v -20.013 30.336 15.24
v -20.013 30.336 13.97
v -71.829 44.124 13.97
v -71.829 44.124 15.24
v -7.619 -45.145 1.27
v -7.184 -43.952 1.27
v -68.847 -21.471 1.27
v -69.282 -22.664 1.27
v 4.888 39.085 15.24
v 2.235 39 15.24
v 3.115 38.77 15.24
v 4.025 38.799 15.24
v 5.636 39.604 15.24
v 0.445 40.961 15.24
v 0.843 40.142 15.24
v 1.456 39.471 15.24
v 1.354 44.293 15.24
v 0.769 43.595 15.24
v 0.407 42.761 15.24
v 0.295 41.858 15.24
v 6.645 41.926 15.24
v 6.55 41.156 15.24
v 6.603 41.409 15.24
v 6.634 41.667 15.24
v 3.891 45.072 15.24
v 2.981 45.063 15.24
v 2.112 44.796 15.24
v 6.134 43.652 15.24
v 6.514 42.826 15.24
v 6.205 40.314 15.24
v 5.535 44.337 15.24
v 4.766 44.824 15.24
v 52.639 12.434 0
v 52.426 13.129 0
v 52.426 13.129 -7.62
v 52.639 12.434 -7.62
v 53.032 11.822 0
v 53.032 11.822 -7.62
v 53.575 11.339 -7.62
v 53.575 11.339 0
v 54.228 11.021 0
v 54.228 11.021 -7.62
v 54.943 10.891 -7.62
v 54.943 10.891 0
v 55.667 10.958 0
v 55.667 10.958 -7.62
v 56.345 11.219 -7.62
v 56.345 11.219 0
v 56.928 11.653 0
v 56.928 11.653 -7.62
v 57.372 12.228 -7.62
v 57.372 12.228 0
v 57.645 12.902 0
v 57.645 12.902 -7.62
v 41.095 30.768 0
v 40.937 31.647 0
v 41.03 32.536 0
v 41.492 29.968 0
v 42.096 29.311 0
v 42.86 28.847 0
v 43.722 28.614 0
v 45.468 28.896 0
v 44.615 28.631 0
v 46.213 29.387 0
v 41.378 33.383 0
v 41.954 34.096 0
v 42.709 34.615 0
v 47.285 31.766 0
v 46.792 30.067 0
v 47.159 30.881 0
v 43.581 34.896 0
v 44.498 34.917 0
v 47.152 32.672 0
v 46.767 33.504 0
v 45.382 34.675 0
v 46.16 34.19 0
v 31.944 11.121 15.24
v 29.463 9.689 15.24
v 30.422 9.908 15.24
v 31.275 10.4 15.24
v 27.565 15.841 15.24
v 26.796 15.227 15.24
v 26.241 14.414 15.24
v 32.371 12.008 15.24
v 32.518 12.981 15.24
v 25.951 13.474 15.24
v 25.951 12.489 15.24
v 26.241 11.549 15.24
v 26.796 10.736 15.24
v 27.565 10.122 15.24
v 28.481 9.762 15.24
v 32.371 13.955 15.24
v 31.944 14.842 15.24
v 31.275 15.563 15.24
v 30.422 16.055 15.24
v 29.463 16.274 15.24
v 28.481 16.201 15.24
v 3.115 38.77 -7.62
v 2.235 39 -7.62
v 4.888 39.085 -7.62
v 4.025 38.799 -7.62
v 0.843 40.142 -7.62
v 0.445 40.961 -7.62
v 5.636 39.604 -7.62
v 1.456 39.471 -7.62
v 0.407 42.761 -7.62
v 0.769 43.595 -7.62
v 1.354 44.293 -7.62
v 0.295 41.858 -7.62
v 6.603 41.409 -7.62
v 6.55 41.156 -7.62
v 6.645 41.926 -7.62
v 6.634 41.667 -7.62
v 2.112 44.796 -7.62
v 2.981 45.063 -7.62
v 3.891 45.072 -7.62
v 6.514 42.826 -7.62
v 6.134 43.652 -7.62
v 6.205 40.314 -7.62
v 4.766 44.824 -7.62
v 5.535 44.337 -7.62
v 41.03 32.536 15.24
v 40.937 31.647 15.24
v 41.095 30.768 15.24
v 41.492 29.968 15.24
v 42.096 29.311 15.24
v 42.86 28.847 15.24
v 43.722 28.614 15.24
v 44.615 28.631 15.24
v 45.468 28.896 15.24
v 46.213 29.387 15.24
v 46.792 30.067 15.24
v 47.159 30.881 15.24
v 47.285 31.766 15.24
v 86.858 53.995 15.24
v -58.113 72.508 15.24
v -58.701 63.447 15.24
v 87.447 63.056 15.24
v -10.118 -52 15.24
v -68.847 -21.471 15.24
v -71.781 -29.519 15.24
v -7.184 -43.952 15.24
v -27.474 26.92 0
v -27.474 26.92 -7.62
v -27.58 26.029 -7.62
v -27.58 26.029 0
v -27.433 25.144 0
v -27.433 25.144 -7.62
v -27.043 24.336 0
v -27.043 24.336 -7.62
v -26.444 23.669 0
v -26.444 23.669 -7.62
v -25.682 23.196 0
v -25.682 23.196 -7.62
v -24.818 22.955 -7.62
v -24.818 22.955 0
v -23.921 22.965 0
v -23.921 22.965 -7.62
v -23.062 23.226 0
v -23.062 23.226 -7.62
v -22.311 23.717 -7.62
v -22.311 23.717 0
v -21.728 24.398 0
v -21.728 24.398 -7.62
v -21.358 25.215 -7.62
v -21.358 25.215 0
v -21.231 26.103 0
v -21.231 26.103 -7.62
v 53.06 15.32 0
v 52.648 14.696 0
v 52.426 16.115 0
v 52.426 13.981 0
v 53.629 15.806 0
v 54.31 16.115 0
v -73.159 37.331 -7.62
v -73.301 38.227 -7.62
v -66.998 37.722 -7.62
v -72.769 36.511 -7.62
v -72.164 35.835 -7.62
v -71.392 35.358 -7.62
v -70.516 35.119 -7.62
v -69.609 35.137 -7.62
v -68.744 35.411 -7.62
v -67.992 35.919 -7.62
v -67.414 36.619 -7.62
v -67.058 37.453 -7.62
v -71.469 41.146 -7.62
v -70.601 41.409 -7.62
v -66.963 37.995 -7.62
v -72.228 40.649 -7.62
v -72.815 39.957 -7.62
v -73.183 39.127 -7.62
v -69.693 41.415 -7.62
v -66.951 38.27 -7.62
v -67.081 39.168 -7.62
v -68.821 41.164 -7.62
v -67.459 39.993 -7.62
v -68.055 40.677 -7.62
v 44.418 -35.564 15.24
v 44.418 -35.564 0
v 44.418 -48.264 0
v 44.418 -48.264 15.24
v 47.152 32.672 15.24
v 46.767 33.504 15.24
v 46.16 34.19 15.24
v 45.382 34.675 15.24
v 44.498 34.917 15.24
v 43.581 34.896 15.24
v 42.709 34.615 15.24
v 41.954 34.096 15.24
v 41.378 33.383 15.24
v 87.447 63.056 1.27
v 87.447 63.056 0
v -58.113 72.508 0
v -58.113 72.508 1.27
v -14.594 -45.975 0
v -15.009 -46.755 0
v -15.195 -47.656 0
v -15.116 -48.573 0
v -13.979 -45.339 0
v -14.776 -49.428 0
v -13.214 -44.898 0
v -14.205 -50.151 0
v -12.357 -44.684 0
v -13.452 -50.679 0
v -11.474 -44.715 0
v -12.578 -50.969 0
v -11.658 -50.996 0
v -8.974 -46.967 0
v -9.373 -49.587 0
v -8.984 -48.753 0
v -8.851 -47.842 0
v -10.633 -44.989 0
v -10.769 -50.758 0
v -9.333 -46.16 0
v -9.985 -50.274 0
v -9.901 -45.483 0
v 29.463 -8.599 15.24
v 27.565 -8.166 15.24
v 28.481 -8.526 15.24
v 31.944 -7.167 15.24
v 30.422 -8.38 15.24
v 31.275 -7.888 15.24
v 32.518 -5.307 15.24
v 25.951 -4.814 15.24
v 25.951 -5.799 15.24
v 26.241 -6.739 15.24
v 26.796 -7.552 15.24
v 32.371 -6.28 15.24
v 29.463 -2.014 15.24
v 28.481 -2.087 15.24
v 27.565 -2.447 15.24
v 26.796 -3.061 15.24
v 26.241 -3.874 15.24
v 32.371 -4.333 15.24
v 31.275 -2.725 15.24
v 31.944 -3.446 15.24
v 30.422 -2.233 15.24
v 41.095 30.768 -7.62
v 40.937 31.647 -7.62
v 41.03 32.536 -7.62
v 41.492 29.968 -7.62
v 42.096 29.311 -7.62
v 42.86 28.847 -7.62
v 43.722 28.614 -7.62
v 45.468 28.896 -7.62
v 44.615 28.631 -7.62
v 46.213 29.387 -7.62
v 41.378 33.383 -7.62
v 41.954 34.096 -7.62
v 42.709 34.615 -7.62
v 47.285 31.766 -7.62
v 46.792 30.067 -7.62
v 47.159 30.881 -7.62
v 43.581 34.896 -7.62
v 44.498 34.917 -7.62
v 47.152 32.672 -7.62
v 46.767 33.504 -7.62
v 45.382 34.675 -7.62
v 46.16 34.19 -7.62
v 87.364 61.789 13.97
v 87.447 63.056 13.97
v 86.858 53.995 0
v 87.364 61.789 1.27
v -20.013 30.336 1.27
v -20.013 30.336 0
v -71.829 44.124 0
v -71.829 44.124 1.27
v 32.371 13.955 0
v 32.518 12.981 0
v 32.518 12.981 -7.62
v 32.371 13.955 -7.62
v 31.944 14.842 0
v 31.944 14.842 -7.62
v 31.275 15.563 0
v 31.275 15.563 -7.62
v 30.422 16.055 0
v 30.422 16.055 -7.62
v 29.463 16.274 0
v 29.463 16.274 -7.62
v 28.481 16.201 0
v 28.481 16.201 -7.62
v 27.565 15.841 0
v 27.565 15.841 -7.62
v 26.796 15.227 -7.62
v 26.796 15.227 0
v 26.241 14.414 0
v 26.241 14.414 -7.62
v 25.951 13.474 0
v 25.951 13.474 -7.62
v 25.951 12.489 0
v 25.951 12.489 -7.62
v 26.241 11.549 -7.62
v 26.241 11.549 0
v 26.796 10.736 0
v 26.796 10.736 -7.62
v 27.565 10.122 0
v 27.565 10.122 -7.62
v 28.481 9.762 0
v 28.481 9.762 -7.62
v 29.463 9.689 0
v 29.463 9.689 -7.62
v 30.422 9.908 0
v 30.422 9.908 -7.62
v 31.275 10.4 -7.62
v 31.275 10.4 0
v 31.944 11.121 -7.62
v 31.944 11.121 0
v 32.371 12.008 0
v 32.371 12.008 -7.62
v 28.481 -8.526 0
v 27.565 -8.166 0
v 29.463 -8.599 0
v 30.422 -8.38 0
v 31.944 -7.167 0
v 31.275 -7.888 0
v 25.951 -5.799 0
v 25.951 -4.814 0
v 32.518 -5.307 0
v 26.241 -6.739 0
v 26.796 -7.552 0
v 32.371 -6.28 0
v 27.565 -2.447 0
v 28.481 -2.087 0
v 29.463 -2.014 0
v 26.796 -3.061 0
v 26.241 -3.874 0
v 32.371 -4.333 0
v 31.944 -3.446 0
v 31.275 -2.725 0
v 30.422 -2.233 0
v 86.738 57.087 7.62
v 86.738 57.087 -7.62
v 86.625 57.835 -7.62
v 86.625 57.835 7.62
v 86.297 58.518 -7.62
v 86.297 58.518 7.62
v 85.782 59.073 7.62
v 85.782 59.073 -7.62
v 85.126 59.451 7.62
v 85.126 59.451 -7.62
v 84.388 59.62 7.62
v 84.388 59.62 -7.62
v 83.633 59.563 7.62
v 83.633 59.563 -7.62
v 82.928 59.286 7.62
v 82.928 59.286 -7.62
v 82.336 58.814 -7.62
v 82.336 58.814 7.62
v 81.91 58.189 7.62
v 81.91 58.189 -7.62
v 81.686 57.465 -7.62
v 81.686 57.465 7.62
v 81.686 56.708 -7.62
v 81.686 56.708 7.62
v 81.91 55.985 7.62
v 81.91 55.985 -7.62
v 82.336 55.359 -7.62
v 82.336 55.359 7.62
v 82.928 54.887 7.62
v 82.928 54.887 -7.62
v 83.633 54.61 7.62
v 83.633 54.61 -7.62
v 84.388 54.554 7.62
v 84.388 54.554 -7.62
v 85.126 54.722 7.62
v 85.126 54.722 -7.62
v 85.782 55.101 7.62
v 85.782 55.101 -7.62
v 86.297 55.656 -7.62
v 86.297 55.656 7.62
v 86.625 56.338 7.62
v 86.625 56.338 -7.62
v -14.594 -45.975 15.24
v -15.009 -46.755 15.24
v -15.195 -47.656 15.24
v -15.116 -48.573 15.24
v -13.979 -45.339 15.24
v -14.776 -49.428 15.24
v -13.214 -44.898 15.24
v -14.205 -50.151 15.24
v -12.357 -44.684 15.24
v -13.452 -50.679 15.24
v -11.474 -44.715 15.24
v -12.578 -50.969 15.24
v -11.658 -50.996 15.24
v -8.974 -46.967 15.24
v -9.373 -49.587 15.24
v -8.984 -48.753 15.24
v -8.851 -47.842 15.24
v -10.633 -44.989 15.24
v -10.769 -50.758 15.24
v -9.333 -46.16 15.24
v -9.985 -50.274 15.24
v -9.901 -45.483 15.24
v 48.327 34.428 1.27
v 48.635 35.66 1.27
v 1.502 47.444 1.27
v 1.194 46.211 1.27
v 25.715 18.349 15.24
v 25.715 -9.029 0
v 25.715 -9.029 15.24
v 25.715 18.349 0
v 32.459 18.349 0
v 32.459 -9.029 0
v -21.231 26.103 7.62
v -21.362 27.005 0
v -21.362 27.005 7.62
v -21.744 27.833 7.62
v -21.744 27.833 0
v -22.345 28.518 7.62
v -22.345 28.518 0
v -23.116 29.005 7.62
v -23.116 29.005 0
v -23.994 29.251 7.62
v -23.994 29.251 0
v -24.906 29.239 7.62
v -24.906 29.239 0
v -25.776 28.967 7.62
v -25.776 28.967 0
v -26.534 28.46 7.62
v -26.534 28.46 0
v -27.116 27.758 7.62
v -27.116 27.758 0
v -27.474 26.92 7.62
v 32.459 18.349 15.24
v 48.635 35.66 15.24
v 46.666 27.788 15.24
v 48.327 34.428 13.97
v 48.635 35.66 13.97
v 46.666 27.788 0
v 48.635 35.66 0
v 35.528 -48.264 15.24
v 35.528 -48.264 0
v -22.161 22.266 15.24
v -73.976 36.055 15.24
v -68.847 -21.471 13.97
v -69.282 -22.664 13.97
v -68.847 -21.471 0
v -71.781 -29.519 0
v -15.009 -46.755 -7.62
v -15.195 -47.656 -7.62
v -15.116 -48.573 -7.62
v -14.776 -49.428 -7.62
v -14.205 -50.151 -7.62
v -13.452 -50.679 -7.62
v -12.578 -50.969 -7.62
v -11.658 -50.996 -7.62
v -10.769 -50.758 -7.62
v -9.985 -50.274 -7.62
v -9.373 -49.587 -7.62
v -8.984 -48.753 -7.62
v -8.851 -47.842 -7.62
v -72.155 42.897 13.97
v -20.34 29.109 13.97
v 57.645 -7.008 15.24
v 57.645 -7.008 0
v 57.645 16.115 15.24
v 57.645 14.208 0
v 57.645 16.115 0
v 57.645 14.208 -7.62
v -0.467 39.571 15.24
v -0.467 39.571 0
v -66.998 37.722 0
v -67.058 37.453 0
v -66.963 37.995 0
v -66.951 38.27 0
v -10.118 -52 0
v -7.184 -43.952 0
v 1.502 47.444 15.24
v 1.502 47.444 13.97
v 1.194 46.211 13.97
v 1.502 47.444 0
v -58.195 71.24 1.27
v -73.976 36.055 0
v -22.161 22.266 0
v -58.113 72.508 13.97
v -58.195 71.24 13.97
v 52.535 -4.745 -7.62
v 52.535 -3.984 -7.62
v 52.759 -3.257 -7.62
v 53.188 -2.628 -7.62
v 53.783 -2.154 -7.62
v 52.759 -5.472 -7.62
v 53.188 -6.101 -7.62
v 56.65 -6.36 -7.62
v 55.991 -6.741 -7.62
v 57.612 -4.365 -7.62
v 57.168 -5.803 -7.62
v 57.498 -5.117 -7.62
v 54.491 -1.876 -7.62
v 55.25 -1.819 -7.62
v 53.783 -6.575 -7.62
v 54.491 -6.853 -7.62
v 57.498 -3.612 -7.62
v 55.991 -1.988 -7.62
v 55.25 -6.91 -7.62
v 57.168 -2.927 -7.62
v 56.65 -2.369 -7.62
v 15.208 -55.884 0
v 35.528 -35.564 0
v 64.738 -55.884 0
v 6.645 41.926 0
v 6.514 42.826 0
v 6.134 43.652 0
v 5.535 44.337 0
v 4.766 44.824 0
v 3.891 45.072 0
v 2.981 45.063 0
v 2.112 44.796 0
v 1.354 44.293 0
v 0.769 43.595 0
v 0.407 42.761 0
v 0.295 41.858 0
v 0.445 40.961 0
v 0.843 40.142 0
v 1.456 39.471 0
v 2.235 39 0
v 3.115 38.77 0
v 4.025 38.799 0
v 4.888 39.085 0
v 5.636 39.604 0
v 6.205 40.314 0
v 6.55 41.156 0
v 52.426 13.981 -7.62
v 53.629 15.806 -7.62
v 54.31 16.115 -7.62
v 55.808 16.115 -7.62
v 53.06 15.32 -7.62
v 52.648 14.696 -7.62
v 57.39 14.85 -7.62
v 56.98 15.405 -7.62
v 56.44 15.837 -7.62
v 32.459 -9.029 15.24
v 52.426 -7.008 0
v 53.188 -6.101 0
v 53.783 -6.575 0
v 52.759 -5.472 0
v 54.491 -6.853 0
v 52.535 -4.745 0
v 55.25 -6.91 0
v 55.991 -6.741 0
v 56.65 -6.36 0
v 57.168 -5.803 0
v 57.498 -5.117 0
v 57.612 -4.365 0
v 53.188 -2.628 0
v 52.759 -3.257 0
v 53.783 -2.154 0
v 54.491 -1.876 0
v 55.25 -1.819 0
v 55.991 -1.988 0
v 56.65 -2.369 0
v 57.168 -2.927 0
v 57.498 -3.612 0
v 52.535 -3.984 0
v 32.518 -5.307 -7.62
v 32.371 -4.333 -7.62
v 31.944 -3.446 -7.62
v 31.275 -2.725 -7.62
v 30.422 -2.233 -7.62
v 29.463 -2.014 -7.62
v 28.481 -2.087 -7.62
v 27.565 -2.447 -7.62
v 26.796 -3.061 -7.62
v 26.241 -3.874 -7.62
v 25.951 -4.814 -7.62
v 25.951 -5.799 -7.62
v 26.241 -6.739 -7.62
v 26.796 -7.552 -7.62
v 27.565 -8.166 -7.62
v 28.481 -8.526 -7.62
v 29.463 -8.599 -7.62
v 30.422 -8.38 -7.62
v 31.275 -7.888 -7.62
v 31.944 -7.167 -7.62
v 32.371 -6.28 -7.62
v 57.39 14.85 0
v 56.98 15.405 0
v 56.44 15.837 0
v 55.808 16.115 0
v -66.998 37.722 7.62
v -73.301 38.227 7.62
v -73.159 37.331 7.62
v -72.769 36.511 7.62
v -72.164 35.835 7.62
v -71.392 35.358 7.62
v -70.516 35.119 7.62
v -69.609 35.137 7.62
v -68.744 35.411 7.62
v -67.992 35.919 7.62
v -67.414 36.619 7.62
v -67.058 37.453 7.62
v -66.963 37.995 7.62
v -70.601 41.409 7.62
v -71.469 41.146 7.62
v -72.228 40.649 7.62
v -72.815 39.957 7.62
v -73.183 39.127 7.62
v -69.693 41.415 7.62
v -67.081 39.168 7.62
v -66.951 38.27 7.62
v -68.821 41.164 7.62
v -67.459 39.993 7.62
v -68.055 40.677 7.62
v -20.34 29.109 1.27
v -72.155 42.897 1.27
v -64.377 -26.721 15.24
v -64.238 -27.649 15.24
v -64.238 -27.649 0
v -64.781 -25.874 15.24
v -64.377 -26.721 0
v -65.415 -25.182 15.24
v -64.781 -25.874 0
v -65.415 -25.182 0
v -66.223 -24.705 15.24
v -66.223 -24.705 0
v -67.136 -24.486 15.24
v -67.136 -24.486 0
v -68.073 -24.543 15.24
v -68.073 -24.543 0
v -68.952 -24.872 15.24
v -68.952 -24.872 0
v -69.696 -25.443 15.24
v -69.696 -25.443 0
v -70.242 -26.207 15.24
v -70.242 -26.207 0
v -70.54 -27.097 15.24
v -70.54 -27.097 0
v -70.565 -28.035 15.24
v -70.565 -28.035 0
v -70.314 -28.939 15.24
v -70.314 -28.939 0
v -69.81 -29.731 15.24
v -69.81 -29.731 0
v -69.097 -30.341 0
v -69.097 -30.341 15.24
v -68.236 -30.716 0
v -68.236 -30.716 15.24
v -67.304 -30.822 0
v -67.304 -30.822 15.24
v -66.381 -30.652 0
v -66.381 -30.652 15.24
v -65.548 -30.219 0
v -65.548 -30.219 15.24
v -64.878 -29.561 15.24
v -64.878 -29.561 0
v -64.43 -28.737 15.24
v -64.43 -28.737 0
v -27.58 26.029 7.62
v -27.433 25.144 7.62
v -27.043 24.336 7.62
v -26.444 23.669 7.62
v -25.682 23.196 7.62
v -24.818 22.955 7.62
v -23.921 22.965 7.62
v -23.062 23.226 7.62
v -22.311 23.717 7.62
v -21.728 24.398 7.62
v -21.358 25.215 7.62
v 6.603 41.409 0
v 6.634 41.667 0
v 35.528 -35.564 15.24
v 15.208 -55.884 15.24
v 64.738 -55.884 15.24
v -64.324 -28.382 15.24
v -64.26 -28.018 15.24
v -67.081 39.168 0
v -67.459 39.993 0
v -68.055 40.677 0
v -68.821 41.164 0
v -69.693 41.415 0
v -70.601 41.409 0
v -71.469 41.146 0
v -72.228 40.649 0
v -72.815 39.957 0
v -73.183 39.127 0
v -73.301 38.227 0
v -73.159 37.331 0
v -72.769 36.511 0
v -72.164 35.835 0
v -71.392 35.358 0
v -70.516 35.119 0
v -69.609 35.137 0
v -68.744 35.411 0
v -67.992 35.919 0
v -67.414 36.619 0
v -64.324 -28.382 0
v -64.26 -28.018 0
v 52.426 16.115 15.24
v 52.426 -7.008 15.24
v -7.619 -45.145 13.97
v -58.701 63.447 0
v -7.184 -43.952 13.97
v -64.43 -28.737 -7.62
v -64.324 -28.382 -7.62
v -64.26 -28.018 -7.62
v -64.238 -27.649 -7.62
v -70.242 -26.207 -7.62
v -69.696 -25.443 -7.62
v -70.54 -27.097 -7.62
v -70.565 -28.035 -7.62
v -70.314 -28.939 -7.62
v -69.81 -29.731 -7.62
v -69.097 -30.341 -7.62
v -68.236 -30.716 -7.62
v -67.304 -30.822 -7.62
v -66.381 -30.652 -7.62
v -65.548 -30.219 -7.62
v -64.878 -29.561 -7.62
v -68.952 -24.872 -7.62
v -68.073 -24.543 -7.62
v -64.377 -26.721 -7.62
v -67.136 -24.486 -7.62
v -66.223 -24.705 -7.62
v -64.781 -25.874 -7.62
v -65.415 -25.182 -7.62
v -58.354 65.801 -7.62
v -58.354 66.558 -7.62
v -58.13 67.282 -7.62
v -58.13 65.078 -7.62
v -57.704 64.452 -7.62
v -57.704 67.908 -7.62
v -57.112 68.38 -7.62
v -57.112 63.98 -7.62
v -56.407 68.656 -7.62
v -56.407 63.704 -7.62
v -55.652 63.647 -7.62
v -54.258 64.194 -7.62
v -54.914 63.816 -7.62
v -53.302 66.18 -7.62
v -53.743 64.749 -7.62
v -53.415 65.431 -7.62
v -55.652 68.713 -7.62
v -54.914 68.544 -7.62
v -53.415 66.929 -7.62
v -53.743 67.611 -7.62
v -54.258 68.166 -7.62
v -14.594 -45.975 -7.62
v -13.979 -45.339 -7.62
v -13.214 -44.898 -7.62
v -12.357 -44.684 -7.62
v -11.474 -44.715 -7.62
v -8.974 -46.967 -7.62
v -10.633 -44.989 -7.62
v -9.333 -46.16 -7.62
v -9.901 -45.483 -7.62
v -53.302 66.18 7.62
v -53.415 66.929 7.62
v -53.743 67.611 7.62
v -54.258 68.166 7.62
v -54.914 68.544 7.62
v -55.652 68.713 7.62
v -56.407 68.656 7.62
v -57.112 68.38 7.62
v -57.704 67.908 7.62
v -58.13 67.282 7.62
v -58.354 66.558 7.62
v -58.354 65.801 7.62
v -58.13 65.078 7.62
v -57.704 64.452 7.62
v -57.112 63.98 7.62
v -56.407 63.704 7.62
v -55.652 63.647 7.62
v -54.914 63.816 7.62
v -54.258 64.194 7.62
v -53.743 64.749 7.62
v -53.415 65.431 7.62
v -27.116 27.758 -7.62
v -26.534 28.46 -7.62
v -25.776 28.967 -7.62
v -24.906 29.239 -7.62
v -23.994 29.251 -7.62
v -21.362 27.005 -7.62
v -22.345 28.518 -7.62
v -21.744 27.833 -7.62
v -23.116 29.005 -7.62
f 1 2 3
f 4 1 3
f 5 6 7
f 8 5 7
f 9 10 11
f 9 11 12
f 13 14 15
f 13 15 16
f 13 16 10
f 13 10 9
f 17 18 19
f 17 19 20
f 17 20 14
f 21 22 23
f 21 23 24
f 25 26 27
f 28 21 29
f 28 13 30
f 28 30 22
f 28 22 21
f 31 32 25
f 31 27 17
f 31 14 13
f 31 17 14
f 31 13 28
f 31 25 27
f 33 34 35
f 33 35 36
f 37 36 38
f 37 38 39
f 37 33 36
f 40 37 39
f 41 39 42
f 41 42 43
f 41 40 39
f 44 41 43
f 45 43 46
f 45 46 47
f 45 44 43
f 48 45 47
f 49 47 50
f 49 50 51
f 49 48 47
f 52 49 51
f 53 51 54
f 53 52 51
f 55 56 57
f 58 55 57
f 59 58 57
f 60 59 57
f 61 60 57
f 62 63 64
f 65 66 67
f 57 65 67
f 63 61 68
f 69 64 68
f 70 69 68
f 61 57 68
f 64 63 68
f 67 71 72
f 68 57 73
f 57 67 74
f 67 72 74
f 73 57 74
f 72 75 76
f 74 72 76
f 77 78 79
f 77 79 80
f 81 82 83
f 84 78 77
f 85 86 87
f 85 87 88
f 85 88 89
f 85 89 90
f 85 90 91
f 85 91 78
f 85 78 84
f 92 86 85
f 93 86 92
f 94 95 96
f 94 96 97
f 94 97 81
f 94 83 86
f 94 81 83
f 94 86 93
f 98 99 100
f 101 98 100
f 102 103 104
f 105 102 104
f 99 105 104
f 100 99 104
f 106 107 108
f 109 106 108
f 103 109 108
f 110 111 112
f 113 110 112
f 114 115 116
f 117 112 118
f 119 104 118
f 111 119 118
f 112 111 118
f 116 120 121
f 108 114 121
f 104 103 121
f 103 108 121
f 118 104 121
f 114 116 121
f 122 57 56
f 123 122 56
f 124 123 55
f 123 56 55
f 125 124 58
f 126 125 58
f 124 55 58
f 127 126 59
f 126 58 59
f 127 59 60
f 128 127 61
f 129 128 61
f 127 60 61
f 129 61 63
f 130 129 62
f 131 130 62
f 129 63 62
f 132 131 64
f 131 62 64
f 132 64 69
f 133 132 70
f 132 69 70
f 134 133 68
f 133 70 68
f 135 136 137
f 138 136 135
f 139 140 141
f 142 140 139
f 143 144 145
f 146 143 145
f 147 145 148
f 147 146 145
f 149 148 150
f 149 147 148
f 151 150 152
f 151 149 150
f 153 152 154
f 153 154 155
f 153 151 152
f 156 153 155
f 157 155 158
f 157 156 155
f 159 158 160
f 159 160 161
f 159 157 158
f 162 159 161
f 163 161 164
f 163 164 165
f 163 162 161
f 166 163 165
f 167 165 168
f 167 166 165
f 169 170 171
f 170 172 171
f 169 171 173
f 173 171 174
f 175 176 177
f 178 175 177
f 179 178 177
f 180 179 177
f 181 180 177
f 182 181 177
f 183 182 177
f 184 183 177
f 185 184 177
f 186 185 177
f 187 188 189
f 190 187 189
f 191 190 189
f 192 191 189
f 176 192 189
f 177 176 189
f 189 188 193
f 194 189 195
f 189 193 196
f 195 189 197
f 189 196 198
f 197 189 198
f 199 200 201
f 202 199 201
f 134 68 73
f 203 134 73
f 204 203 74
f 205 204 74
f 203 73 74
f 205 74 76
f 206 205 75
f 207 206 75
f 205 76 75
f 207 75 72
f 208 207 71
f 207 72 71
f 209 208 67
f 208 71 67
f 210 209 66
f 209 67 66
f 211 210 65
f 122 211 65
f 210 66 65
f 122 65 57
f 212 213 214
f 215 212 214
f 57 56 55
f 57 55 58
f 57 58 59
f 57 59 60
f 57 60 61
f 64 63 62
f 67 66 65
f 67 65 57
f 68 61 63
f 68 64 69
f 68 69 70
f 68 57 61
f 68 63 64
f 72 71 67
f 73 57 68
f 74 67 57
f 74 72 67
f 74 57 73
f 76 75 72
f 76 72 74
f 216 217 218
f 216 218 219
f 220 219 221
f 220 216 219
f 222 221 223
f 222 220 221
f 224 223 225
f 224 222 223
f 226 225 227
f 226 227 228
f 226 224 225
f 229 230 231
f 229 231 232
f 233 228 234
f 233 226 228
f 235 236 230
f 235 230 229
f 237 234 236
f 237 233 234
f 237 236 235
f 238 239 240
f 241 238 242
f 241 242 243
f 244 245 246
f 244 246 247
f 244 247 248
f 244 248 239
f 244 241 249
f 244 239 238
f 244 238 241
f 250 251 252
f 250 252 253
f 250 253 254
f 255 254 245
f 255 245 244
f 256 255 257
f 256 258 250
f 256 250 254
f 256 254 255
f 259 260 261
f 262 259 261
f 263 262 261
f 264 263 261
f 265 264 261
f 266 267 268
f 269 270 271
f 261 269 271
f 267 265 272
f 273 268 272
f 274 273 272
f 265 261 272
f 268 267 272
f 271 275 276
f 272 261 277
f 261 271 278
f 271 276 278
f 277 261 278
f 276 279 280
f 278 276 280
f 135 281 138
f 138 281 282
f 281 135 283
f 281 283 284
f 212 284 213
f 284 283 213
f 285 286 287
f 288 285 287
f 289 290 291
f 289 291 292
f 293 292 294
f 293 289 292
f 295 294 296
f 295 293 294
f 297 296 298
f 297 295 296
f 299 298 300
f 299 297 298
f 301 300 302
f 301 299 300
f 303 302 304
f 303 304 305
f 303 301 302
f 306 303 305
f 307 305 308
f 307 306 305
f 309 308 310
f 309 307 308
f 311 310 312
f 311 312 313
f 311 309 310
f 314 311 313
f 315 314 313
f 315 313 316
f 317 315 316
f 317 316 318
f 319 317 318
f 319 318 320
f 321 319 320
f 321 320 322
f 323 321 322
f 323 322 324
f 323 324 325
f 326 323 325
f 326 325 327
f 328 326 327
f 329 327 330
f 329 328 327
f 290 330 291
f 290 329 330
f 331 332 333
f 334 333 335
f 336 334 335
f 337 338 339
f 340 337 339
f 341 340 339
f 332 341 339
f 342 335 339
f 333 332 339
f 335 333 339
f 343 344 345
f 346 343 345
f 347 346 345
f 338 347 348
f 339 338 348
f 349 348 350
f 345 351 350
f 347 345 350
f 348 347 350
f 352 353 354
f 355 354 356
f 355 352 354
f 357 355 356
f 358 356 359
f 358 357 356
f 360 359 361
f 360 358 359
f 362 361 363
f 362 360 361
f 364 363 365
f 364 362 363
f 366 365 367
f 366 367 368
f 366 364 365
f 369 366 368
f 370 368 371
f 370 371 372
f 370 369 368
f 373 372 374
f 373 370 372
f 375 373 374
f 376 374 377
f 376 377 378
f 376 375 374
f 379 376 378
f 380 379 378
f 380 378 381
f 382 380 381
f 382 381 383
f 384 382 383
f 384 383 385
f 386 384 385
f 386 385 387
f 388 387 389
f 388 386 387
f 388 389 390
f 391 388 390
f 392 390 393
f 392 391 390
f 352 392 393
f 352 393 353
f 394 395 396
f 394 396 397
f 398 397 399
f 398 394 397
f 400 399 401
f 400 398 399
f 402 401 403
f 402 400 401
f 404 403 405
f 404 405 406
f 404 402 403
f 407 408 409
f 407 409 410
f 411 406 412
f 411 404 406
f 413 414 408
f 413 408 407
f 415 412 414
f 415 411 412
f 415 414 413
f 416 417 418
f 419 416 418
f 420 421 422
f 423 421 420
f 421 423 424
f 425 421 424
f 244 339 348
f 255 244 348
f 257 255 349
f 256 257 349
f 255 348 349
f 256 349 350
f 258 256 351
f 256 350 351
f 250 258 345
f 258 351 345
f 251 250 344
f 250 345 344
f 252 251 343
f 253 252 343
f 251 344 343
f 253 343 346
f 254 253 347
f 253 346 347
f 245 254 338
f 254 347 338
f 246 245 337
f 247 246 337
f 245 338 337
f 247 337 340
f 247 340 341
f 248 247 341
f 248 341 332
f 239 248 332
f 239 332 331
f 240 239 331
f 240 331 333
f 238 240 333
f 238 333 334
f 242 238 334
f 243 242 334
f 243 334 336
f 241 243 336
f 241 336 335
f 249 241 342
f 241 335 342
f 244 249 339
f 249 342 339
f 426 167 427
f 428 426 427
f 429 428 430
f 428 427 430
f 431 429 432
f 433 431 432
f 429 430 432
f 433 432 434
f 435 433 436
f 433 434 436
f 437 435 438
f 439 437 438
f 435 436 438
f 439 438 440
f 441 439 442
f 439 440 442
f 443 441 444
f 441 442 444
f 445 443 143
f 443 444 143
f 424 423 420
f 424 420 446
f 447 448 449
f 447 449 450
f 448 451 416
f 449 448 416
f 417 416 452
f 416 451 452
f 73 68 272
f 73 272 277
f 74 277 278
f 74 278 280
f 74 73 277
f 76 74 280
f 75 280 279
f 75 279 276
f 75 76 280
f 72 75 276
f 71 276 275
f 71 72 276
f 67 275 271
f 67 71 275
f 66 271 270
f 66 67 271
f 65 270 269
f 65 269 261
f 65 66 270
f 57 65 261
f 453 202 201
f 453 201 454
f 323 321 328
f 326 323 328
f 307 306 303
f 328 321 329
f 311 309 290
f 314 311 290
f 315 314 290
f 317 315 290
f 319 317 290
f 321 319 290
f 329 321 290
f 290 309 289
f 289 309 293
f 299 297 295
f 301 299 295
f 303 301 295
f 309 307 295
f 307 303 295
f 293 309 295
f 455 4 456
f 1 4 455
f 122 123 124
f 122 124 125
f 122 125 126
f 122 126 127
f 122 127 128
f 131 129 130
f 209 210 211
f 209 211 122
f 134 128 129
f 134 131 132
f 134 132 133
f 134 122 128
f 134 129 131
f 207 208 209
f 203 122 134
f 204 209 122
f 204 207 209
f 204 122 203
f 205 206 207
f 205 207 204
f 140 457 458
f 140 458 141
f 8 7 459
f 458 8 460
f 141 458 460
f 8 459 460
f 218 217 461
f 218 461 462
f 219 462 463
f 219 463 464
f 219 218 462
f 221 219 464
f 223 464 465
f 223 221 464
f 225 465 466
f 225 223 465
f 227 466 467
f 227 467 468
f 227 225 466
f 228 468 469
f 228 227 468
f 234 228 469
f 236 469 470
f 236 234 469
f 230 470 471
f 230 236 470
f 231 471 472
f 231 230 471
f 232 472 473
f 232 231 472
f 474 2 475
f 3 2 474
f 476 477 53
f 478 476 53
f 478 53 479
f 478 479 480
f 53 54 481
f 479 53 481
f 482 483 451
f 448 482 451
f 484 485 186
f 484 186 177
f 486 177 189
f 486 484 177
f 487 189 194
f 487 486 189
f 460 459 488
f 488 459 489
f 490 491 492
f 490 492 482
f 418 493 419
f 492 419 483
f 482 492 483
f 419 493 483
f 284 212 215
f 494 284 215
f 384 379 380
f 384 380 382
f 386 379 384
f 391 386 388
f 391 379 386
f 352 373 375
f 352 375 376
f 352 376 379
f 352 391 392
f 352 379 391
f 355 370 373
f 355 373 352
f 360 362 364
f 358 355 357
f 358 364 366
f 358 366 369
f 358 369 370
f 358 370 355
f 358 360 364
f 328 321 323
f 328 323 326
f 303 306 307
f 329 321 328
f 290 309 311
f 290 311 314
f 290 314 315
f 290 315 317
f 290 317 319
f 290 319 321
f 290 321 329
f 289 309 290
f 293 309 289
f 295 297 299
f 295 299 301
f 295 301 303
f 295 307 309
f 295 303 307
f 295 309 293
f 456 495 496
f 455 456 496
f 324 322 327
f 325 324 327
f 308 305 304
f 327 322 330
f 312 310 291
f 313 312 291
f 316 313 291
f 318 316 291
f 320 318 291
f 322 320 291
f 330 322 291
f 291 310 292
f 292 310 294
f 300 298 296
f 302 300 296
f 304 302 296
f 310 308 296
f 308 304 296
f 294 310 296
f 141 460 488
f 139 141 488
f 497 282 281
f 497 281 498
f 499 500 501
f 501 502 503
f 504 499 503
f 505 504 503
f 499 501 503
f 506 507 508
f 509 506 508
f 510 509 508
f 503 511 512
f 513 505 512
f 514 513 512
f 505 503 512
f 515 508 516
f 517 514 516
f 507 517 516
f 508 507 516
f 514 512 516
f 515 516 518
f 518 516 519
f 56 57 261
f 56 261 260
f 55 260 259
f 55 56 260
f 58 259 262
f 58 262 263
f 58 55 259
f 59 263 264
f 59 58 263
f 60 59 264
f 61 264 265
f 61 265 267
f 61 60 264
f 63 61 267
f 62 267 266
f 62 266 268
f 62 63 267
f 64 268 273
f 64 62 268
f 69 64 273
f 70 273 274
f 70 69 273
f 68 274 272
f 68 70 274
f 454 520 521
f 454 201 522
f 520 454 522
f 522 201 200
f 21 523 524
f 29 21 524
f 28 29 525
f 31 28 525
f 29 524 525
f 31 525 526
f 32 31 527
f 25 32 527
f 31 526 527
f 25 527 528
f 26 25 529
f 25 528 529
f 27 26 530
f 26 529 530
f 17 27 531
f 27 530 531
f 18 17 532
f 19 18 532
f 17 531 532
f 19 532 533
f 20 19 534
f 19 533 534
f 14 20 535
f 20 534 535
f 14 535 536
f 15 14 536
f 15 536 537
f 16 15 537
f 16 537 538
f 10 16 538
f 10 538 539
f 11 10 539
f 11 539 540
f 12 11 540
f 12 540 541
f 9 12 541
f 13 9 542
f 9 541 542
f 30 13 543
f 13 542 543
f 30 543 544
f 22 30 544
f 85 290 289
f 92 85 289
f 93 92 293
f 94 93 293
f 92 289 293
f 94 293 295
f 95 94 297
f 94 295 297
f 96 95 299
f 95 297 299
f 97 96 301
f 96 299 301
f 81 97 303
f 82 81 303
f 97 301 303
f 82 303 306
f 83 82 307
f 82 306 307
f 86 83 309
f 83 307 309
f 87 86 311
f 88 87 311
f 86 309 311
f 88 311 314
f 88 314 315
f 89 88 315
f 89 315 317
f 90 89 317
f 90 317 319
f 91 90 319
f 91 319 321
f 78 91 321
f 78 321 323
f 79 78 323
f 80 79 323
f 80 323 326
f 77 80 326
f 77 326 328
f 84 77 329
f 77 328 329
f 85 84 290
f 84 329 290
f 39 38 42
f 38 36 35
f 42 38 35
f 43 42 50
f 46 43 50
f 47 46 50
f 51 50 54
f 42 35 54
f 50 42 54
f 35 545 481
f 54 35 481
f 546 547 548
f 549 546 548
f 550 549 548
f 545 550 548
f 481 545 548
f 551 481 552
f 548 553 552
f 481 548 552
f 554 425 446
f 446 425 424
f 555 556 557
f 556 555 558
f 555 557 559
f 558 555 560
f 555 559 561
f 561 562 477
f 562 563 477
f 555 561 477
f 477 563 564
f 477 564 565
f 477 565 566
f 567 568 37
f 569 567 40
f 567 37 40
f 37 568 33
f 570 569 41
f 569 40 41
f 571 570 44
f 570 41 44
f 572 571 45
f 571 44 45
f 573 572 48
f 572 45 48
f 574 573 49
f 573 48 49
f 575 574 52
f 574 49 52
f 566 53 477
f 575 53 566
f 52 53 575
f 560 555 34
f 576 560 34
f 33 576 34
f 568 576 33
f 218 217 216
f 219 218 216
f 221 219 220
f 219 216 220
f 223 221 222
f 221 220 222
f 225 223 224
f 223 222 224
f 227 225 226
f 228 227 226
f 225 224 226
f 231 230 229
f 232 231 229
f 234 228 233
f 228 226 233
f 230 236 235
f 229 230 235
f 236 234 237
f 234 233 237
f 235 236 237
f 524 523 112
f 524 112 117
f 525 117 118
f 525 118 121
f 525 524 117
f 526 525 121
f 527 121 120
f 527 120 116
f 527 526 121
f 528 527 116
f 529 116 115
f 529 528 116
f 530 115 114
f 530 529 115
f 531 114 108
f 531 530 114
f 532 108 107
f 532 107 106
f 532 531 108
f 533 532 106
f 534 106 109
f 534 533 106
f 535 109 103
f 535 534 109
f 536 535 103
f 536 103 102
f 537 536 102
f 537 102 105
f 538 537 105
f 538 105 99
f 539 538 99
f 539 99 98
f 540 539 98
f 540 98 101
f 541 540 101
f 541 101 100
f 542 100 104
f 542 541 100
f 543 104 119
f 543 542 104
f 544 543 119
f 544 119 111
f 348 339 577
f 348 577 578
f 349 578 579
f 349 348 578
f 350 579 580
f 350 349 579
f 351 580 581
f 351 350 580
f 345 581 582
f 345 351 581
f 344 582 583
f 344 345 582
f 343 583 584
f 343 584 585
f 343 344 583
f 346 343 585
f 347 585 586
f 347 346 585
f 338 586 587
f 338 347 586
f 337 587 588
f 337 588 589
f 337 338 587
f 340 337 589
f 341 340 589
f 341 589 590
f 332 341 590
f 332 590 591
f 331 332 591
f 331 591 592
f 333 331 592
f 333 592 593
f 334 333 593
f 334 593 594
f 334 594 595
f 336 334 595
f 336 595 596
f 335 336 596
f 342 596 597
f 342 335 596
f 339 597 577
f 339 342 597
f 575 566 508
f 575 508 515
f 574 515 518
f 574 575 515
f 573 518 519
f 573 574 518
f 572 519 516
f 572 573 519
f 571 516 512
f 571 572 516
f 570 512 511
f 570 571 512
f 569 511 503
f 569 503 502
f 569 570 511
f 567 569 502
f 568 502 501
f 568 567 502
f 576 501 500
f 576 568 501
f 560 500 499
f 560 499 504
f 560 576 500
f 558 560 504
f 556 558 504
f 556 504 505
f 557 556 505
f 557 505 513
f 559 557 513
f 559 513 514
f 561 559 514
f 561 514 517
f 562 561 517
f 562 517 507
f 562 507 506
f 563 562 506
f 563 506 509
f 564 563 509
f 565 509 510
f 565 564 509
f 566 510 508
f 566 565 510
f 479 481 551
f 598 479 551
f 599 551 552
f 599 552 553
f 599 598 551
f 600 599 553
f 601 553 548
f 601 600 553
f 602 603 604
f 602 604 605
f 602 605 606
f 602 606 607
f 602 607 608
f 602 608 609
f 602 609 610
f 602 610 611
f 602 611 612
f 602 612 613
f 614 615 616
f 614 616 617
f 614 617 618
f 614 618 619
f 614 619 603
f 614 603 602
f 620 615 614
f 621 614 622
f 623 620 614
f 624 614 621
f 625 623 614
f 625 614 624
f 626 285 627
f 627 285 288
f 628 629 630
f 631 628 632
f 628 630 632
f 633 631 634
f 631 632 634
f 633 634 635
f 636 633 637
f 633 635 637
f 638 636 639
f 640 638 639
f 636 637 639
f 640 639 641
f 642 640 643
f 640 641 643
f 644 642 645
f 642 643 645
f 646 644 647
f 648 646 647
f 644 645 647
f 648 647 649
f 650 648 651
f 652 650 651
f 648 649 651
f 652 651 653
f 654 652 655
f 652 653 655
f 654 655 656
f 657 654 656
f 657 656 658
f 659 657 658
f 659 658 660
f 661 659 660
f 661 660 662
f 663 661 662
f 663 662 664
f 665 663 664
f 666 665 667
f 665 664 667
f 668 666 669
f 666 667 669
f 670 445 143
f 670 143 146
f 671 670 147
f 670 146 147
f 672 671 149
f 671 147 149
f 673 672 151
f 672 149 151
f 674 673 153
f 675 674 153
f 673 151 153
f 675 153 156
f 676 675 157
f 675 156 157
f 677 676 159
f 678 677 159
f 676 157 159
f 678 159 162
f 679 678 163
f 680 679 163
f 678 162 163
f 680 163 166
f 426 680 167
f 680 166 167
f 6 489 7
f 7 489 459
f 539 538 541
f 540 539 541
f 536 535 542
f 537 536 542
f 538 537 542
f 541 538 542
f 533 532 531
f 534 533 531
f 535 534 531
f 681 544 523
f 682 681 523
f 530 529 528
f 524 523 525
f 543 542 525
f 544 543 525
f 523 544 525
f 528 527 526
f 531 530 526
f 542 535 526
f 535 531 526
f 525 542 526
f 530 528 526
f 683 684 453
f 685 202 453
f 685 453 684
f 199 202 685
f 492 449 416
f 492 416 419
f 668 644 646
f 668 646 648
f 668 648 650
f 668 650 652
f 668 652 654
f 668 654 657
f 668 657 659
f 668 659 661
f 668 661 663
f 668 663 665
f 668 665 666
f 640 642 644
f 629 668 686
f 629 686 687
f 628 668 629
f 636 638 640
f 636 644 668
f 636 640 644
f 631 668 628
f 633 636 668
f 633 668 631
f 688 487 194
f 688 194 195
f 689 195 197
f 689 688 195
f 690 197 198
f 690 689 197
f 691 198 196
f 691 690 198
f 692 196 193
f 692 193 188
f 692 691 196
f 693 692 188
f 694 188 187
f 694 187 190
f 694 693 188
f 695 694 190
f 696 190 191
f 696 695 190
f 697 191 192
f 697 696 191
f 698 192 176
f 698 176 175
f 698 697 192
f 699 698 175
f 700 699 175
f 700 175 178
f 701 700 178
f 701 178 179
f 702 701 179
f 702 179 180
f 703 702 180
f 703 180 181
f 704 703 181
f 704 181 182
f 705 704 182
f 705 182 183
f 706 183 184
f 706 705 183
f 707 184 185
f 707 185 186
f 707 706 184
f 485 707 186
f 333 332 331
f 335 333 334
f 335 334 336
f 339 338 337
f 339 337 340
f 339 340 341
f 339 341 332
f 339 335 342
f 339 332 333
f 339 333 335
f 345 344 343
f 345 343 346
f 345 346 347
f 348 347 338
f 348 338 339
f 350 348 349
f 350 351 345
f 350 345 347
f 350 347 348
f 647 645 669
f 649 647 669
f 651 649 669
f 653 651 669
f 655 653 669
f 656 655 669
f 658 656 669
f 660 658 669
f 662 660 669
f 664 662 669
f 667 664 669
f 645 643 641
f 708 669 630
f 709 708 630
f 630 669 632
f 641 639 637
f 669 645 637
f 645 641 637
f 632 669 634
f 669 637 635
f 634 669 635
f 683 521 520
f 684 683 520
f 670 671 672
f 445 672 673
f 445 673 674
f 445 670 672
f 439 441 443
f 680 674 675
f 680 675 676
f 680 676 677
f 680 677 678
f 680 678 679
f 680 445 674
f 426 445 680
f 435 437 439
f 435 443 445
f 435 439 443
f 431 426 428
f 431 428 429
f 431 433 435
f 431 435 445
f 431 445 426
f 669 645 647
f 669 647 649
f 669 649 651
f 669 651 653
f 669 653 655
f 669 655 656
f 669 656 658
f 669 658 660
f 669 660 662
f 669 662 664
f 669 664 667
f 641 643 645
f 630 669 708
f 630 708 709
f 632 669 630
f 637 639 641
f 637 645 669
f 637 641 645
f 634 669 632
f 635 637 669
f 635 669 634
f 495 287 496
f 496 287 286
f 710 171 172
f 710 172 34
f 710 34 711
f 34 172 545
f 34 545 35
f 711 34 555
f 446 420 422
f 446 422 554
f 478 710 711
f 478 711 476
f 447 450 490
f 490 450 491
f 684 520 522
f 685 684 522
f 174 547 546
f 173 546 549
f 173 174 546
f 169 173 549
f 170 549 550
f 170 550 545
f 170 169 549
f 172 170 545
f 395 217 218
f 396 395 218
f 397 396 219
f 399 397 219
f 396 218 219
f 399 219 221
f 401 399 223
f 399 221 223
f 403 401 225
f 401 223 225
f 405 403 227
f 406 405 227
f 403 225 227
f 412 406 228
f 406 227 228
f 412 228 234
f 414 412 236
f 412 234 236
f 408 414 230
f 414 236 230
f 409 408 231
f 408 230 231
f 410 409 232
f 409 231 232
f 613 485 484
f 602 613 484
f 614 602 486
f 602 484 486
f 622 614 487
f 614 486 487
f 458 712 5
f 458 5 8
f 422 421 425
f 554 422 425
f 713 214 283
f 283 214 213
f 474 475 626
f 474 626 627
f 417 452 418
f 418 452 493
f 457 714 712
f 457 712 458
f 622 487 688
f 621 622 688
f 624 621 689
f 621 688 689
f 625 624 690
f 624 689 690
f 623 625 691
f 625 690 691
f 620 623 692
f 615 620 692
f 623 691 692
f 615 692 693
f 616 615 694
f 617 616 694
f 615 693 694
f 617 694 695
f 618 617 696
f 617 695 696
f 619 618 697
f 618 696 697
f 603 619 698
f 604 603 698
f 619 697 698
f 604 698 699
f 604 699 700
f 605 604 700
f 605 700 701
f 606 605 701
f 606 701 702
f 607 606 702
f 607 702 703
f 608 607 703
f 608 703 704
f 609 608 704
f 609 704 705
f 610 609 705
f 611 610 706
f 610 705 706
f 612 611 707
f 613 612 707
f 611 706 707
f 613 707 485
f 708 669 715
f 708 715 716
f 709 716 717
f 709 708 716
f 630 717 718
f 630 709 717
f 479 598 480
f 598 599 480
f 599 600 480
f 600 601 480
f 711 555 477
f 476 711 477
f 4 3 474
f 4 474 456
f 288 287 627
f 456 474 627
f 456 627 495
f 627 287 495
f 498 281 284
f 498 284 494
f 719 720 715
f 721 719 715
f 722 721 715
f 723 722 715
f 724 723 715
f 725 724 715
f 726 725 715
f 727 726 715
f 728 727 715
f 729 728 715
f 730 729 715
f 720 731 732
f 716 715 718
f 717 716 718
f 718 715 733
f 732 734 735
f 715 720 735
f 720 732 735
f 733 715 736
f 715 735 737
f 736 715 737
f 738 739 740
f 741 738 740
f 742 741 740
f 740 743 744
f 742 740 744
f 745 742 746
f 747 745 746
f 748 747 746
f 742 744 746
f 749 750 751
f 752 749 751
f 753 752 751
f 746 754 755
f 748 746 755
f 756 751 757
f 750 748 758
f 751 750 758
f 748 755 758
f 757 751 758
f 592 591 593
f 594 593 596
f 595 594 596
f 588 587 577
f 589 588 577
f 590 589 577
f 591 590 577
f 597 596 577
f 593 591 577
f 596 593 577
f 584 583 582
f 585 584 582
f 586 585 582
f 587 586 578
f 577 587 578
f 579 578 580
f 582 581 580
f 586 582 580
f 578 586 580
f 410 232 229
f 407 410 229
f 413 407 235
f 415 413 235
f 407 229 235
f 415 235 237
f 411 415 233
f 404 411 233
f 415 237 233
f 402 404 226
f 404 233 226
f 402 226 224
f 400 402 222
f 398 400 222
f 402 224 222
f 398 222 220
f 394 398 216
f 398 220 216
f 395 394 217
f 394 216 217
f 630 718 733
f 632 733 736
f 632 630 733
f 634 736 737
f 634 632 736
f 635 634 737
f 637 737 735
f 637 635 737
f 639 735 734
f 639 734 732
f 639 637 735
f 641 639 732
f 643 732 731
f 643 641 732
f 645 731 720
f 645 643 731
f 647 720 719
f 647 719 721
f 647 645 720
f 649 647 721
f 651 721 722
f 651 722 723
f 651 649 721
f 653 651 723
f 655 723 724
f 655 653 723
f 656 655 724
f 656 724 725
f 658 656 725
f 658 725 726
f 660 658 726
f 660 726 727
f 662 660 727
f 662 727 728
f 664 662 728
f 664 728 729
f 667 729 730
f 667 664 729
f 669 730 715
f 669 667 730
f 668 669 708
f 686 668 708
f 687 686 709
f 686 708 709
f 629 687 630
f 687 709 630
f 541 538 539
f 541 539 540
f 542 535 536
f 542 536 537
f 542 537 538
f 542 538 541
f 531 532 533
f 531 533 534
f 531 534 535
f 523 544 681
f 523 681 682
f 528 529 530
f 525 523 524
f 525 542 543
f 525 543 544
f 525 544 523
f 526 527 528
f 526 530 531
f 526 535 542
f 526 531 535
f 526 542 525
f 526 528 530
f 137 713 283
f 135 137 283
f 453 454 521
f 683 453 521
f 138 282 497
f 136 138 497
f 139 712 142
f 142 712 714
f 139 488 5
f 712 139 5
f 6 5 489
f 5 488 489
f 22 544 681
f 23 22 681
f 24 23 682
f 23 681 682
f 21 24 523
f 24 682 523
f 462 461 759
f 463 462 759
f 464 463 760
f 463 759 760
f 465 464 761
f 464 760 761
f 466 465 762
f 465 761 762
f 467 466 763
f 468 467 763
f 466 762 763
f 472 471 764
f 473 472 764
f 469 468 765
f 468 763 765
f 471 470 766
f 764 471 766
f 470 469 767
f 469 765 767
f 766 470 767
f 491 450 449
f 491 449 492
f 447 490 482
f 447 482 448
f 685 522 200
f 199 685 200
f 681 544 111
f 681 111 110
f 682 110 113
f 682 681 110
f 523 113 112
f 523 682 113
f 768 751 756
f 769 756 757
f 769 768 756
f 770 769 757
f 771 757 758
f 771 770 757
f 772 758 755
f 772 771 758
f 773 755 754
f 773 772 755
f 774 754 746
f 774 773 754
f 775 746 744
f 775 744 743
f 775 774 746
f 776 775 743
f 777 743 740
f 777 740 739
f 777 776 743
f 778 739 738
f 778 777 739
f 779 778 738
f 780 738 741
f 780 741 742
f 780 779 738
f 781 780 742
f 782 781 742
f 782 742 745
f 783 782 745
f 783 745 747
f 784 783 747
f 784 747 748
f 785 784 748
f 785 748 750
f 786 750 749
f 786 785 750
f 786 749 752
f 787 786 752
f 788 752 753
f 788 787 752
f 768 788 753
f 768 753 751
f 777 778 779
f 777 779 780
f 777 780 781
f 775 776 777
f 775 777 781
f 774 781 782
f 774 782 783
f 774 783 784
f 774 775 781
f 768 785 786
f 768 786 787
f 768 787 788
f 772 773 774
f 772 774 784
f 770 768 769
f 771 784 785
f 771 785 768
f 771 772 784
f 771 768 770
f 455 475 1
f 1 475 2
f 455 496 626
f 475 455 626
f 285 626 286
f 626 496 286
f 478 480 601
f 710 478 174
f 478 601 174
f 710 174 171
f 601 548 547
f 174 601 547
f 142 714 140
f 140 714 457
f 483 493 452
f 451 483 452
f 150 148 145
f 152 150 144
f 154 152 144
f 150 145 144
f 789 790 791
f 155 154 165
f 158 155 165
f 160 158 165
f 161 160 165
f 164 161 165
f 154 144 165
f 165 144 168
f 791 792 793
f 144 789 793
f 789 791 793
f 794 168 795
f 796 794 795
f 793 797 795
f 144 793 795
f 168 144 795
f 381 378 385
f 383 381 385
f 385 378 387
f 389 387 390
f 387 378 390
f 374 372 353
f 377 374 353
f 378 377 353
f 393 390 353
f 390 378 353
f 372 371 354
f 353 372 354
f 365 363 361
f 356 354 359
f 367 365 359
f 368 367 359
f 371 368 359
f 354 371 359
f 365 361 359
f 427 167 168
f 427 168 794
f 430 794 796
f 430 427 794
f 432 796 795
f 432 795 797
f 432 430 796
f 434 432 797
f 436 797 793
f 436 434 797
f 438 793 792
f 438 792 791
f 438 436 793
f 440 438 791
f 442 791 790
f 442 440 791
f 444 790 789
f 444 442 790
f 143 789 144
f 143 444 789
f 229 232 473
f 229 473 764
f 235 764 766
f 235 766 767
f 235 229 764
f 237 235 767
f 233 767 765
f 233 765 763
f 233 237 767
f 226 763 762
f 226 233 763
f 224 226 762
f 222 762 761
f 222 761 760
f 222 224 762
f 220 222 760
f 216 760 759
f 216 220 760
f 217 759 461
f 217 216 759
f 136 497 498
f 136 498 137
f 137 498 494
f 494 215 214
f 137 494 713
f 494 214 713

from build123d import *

# Parameters (mm, degrees)
F2_DEPTH  = 7.62
F3_DEPTH  = 15.24
F5_DEPTH  = 15.24
F6_W      = 65.6332046197
F6_H      = 12.7
F7_DEPTH  = 0.762
F9_DEPTH  = 7.62
F10_DEPTH = 15.24
F12_DEPTH = 15.24
F13_W     = 48.5836209363
F13_H     = 12.7
F14_DEPTH = 1.27
F15_R     = 3.302
F16_DEPTH = 7.62
F17_DEPTH = 15.24
F18_W     = 6.7440699786
F18_H     = 27.3777097464
F19_DEPTH = 15.24
F21_DEPTH = 15.24
F22_DEPTH = 7.62
F24_DEPTH = 15.24
F25_W     = 53.6186267683
F25_H     = 12.7
F26_DEPTH = 1.27
F28_DEPTH = 15.24
F29_W     = 65.6332046197
F29_H     = 12.7
F30_DEPTH = 1.27
F31_R     = 2.54
F32_DEPTH = 7.62
F33_DEPTH = 15.24
F34_W     = 145.8661322359
F34_H     = 12.7
F35_DEPTH = 1.27
F36_R     = 2.5527
F37_DEPTH = 15.24
F38_DEPTH = 7.62


with BuildPart() as f2:
    # F1 (on Top) → F2 (new body)
    with BuildSketch(Plane.XY):
        with BuildLine():
            ThreePointArc((-64.4301145906, -28.7365379278), (-64.2864385694, -28.2011943594), (-64.2380550206, -27.649021771))
            ThreePointArc((-64.2380550206, -27.649021771), (-70.5396714717, -27.0968491825), (-64.4301145906, -28.7365379278))
        make_face()
    extrude(amount=-F2_DEPTH)


with BuildPart() as f2b:
    # F1 (on Top) → F2, piece 2 (new body)
    with BuildSketch(Plane.XY):
        with BuildLine():
            ThreePointArc((-8.8508171172, -47.842021771), (-11.4736445288, -44.7154053198), (-15.0087575472, -46.7545056141))
            ThreePointArc((-15.0087575472, -46.7545056141), (-12.5779897057, -50.9686382221), (-8.8508171172, -47.842021771))
        make_face()
    extrude(amount=-F2_DEPTH)


with BuildPart() as f3:
    # F3 (new): a face of the model
    f3_faces = [f2.part.faces().sort_by_distance(p)[0] for p in [
        (-67.4130550206, -27.649021771, 0),
    ]]
    extrude(f3_faces, amount=F3_DEPTH)


with BuildPart() as f3b:
    # F3#2 (new): a face of the model
    f3_2_faces = [f2b.part.faces().sort_by_distance(p)[0] for p in [
        (-12.0258171172, -47.842021771, 0),
    ]]
    extrude(f3_2_faces, amount=F3_DEPTH)


with BuildPart() as f5:
    # F4 (on Top) → F5 (new body)
    with BuildSketch(Plane.XY):
        Polygon((-68.8470715069, -21.4705884695), (-71.7812530259, -29.5187343538), (-10.1182799212, -51.9997329203), (-7.1840984022, -43.9515870359), align=None)
    extrude(amount=F5_DEPTH)

    # F6 (on face) → F7 (cut)
    with BuildSketch(Plane(origin=(-14.9867037038, -41.1069243515, 0), x_dir=(-0.9395087968, 0.3425247738, 0), z_dir=(0.3425247738, 0.9395087968, 0))):
        with Locations((24.5116185482, 7.62)):
            Rectangle(F6_W, F6_H)
    extrude(amount=-F7_DEPTH, mode=Mode.SUBTRACT)


with BuildPart() as f9:
    # F8 (on Top) → F9 (new body)
    with BuildSketch(Plane.XY):
        with BuildLine():
            ThreePointArc((6.5499569589, 41.1555171078), (6.6209660134, 41.537635855), (6.6447545209, 41.9255677172))
            ThreePointArc((6.6447545209, 41.9255677172), (0.3185430285, 42.3134995795), (6.5499569589, 41.1555171078))
        make_face()
    extrude(amount=-F9_DEPTH)


with BuildPart() as f9b:
    # F8 (on Top) → F9, piece 2 (new body)
    with BuildSketch(Plane.XY):
        with BuildLine():
            ThreePointArc((47.2847545209, 31.7655677172), (44.4976863832, 34.9167792097), (41.029552083, 32.5356183267))
            ThreePointArc((41.029552083, 32.5356183267), (43.7218226587, 28.6143562248), (47.2847545209, 31.7655677172))
        make_face()
    extrude(amount=-F9_DEPTH)


with BuildPart() as f10:
    # F10 (new): a face of the model
    f10_faces = [f9.part.faces().sort_by_distance(p)[0] for p in [
        (3.4697545209, 41.9255677172, 0),
    ]]
    extrude(f10_faces, amount=F10_DEPTH)


with BuildPart() as f10b:
    # F10#2 (new): a face of the model
    f10_2_faces = [f9b.part.faces().sort_by_distance(p)[0] for p in [
        (44.1097545209, 31.7655677172, 0),
    ]]
    extrude(f10_2_faces, amount=F10_DEPTH)


with BuildPart() as f12:
    # F11 (on Top) → F12 (new body)
    with BuildSketch(Plane.XY):
        Polygon((48.6346241865, 35.6602623446), (1.5015887053, 47.4435212149), (-0.4665534053, 39.5709527725), (46.6664820759, 27.7876939022), align=None)
    extrude(amount=F12_DEPTH)

    # F13 (on face) → F14 (cut)
    with BuildSketch(Plane(origin=(11.2515102097, 45.0060408388, 0), x_dir=(-0.9701425001, 0.242535625, 0), z_dir=(0.242535625, 0.9701425001, 0))):
        with Locations((-14.2418214171, 7.62)):
            Rectangle(F13_W, F13_H)
    extrude(amount=-F14_DEPTH, mode=Mode.SUBTRACT)


with BuildPart() as f16:
    # F15 (on Top) → F16 (new body)
    with BuildSketch(Plane.XY):
        with Locations((29.2160604149, 12.9814512787)):
            Circle(F15_R)
    extrude(amount=-F16_DEPTH)


with BuildPart() as f16b:
    # F15 (on Top) → F16, piece 2 (new body)
    with BuildSketch(Plane.XY):
        with Locations((29.2160604149, -5.3065487213)):
            Circle(F15_R)
    extrude(amount=-F16_DEPTH)


with BuildPart() as f17:
    # F17 (new): a face of the model
    f17_faces = [f16.part.faces().sort_by_distance(p)[0] for p in [
        (29.2160604149, 12.9814512787, 0),
    ]]
    extrude(f17_faces, amount=F17_DEPTH)


with BuildPart() as f17b:
    # F17#2 (new): a face of the model
    f17_2_faces = [f16b.part.faces().sort_by_distance(p)[0] for p in [
        (29.2160604149, -5.3065487213, 0),
    ]]
    extrude(f17_2_faces, amount=F17_DEPTH)


with BuildPart() as f19:
    # F18 (on Top) → F19 (new body)
    with BuildSketch(Plane.XY):
        with Locations((29.0872352198, 4.6601220965)):
            Rectangle(F18_W, F18_H)
    extrude(amount=F19_DEPTH)


with BuildPart() as f21:
    # F20 (on Top) → F21 (new body)
    with BuildSketch(Plane.XY):
        Polygon((35.5280892919, -48.263547454), (35.5280892919, -35.563547454), (15.2080892919, -55.883547454), (64.7380892919, -55.883547454), (44.4180892919, -35.563547454), (44.4180892919, -48.263547454), align=None)
    extrude(amount=F21_DEPTH)


with BuildPart() as f22:
    # F0 (on Top) → F22 (new body, symmetric)
    with BuildSketch(Plane.XY):
        with BuildLine():
            ThreePointArc((-67.0576035657, 37.4532502033), (-66.9776316641, 37.8580175355), (-66.9508234596, 38.2697376084))
            ThreePointArc((-66.9508234596, 38.2697376084), (-73.2740152552, 38.6814576813), (-67.0576035657, 37.4532502033))
        make_face()
    extrude(amount=F22_DEPTH, both=True)


with BuildPart() as f22b:
    # F0 (on Top) → F22, piece 2 (new body, symmetric)
    with BuildSketch(Plane.XY):
        with BuildLine():
            ThreePointArc((-21.2308234596, 26.1031376084), (-23.9941033867, 29.251329404), (-27.4740433535, 26.9196250135))
            ThreePointArc((-27.4740433535, 26.9196250135), (-24.8175435325, 22.9549458129), (-21.2308234596, 26.1031376084))
        make_face()
    extrude(amount=F22_DEPTH, both=True)


with BuildPart() as f24:
    # F23 (on Top) → F24 (new body)
    with BuildSketch(Plane.XY):
        Polygon((-71.8287429624, 44.1244396145), (-73.9761553172, 36.0548316004), (-22.1608049758, 22.2661911485), (-20.0133926209, 30.3357991625), align=None)
    extrude(amount=F24_DEPTH)

    # F25 (on face) → F26 (cut)
    with BuildSketch(Plane(origin=(6.2153047772, 23.3560513549, 0), x_dir=(-0.9663684705, 0.2571613874, 0), z_dir=(0.2571613874, 0.9663684705, 0))):
        with Locations((53.9508212027, 7.62)):
            Rectangle(F25_W, F25_H)
    extrude(amount=-F26_DEPTH, mode=Mode.SUBTRACT)


with BuildPart() as f28:
    # F4 (on Top) → F28 (new body)
    with BuildSketch(Plane.XY):
        Polygon((-68.8470715069, -21.4705884695), (-71.7812530259, -29.5187343538), (-10.1182799212, -51.9997329203), (-7.1840984022, -43.9515870359), align=None)
    extrude(amount=F28_DEPTH)

    # F29 (on face) → F30 (cut)
    with BuildSketch(Plane(origin=(-14.9867037038, -41.1069243515, 0), x_dir=(-0.9395087968, 0.3425247738, 0), z_dir=(0.3425247738, 0.9395087968, 0))):
        with Locations((24.5116185482, 7.62)):
            Rectangle(F29_W, F29_H)
    extrude(amount=-F30_DEPTH, mode=Mode.SUBTRACT)


with BuildPart() as f32:
    # F31 (on Top) → F32 (new body, symmetric)
    with BuildSketch(Plane.XY):
        with Locations((-55.8419707447, 66.1799226339)):
            Circle(F31_R)
    extrude(amount=F32_DEPTH, both=True)


with BuildPart() as f32b:
    # F31 (on Top) → F32, piece 2 (new body, symmetric)
    with BuildSketch(Plane.XY):
        with Locations((84.1981161545, 57.0867226339)):
            Circle(F31_R)
    extrude(amount=F32_DEPTH, both=True)


with BuildPart() as f33:
    # F31 (on Top) → F33 (new body)
    with BuildSketch(Plane.XY):
        Polygon((87.4465803008, 63.0559547052), (-58.1130151955, 72.5075520519), (-58.701358828, 63.4467490984), (86.8582366683, 53.9951517517), align=None)
        with Locations((84.1981161545, 57.0867226339)):
            Circle(F31_R, mode=Mode.SUBTRACT)
        with Locations((-55.8419707447, 66.1799226339)):
            Circle(F31_R, mode=Mode.SUBTRACT)
        with Locations((-55.8419707447, 66.1799226339)):
            Circle(F31_R)
        with Locations((84.1981161545, 57.0867226339)):
            Circle(F31_R)
    extrude(amount=F33_DEPTH)

    # F34 (on face) → F35 (cut)
    with BuildSketch(Plane(origin=(4.4443619956, 68.4455241364, 0), x_dir=(-0.9978985064, 0.0647963801, 0), z_dir=(0.0647963801, 0.9978985064, 0))):
        with Locations((-10.2439481482, 7.62)):
            Rectangle(F34_W, F34_H)
    extrude(amount=-F35_DEPTH, mode=Mode.SUBTRACT)


with BuildPart() as f37:
    # F36 (on Top) → F37 (new body)
    with BuildSketch(Plane.XY):
        with BuildLine():
            Line((57.6447546482, -7.0078326389), (57.6447546482, 12.9022978134))
            ThreePointArc((57.6447546482, 12.9022978134), (54.94319352, 10.8905093291), (52.4261258543, 13.1288336579))
            Line((52.4261258543, 13.1288336579), (52.4261258543, -7.0078326389))
            Line((52.4261258543, -7.0078326389), (57.6447546482, -7.0078326389))
        make_face()
        with Locations((55.0588565974, -4.3646999029)):
            Circle(F36_R, mode=Mode.SUBTRACT)
        with BuildLine():
            Line((57.6447546482, 12.9022978134), (57.6447546482, 14.2077023807))
            ThreePointArc((57.6447546482, 14.2077023807), (56.9796356536, 15.4052694876), (55.8077692005, 16.1146912724))
            Line((55.8077692005, 16.1146912724), (54.3099439944, 16.1146912724))
            ThreePointArc((54.3099439944, 16.1146912724), (53.0596417815, 15.3202278783), (52.4261258543, 13.9811665362))
            Line((52.4261258543, 13.9811665362), (52.4261258543, 13.1288336579))
            ThreePointArc((52.4261258543, 13.1288336579), (54.94319352, 10.8905093291), (57.6447546482, 12.9022978134))
        make_face()
        with Locations((55.0588565974, -4.3646999029)):
            Circle(F36_R)
        with BuildLine():
            ThreePointArc((52.4261258543, 13.9811665362), (53.0596417815, 15.3202278783), (54.3099439944, 16.1146912724))
            Line((54.3099439944, 16.1146912724), (52.4261258543, 16.1146912724))
            Line((52.4261258543, 16.1146912724), (52.4261258543, 13.9811665362))
        make_face()
        with BuildLine():
            ThreePointArc((55.8077692005, 16.1146912724), (56.9796356536, 15.4052694876), (57.6447546482, 14.2077023807))
            Line((57.6447546482, 14.2077023807), (57.6447546482, 16.1146912724))
            Line((57.6447546482, 16.1146912724), (55.8077692005, 16.1146912724))
        make_face()
    extrude(amount=F37_DEPTH)

    # F36 (on Top) → F38 (join)
    with BuildSketch(Plane.XY):
        with BuildLine():
            Line((57.6447546482, 12.9022978134), (57.6447546482, 14.2077023807))
            ThreePointArc((57.6447546482, 14.2077023807), (56.9796356536, 15.4052694876), (55.8077692005, 16.1146912724))
            Line((55.8077692005, 16.1146912724), (54.3099439944, 16.1146912724))
            ThreePointArc((54.3099439944, 16.1146912724), (53.0596417815, 15.3202278783), (52.4261258543, 13.9811665362))
            Line((52.4261258543, 13.9811665362), (52.4261258543, 13.1288336579))
            ThreePointArc((52.4261258543, 13.1288336579), (54.94319352, 10.8905093291), (57.6447546482, 12.9022978134))
        make_face()
        with Locations((55.0588565974, -4.3646999029)):
            Circle(F36_R)
    extrude(amount=-F38_DEPTH)


solid = Compound([f2.part, f2b.part, f3.part, f3b.part, f9.part, f9b.part, f10.part, f10b.part, f12.part, f16.part, f16b.part, f17.part, f17b.part, f19.part, f21.part, f22.part, f22b.part, f24.part, f28.part, f32.part, f32b.part, f33.part, f37.part])
